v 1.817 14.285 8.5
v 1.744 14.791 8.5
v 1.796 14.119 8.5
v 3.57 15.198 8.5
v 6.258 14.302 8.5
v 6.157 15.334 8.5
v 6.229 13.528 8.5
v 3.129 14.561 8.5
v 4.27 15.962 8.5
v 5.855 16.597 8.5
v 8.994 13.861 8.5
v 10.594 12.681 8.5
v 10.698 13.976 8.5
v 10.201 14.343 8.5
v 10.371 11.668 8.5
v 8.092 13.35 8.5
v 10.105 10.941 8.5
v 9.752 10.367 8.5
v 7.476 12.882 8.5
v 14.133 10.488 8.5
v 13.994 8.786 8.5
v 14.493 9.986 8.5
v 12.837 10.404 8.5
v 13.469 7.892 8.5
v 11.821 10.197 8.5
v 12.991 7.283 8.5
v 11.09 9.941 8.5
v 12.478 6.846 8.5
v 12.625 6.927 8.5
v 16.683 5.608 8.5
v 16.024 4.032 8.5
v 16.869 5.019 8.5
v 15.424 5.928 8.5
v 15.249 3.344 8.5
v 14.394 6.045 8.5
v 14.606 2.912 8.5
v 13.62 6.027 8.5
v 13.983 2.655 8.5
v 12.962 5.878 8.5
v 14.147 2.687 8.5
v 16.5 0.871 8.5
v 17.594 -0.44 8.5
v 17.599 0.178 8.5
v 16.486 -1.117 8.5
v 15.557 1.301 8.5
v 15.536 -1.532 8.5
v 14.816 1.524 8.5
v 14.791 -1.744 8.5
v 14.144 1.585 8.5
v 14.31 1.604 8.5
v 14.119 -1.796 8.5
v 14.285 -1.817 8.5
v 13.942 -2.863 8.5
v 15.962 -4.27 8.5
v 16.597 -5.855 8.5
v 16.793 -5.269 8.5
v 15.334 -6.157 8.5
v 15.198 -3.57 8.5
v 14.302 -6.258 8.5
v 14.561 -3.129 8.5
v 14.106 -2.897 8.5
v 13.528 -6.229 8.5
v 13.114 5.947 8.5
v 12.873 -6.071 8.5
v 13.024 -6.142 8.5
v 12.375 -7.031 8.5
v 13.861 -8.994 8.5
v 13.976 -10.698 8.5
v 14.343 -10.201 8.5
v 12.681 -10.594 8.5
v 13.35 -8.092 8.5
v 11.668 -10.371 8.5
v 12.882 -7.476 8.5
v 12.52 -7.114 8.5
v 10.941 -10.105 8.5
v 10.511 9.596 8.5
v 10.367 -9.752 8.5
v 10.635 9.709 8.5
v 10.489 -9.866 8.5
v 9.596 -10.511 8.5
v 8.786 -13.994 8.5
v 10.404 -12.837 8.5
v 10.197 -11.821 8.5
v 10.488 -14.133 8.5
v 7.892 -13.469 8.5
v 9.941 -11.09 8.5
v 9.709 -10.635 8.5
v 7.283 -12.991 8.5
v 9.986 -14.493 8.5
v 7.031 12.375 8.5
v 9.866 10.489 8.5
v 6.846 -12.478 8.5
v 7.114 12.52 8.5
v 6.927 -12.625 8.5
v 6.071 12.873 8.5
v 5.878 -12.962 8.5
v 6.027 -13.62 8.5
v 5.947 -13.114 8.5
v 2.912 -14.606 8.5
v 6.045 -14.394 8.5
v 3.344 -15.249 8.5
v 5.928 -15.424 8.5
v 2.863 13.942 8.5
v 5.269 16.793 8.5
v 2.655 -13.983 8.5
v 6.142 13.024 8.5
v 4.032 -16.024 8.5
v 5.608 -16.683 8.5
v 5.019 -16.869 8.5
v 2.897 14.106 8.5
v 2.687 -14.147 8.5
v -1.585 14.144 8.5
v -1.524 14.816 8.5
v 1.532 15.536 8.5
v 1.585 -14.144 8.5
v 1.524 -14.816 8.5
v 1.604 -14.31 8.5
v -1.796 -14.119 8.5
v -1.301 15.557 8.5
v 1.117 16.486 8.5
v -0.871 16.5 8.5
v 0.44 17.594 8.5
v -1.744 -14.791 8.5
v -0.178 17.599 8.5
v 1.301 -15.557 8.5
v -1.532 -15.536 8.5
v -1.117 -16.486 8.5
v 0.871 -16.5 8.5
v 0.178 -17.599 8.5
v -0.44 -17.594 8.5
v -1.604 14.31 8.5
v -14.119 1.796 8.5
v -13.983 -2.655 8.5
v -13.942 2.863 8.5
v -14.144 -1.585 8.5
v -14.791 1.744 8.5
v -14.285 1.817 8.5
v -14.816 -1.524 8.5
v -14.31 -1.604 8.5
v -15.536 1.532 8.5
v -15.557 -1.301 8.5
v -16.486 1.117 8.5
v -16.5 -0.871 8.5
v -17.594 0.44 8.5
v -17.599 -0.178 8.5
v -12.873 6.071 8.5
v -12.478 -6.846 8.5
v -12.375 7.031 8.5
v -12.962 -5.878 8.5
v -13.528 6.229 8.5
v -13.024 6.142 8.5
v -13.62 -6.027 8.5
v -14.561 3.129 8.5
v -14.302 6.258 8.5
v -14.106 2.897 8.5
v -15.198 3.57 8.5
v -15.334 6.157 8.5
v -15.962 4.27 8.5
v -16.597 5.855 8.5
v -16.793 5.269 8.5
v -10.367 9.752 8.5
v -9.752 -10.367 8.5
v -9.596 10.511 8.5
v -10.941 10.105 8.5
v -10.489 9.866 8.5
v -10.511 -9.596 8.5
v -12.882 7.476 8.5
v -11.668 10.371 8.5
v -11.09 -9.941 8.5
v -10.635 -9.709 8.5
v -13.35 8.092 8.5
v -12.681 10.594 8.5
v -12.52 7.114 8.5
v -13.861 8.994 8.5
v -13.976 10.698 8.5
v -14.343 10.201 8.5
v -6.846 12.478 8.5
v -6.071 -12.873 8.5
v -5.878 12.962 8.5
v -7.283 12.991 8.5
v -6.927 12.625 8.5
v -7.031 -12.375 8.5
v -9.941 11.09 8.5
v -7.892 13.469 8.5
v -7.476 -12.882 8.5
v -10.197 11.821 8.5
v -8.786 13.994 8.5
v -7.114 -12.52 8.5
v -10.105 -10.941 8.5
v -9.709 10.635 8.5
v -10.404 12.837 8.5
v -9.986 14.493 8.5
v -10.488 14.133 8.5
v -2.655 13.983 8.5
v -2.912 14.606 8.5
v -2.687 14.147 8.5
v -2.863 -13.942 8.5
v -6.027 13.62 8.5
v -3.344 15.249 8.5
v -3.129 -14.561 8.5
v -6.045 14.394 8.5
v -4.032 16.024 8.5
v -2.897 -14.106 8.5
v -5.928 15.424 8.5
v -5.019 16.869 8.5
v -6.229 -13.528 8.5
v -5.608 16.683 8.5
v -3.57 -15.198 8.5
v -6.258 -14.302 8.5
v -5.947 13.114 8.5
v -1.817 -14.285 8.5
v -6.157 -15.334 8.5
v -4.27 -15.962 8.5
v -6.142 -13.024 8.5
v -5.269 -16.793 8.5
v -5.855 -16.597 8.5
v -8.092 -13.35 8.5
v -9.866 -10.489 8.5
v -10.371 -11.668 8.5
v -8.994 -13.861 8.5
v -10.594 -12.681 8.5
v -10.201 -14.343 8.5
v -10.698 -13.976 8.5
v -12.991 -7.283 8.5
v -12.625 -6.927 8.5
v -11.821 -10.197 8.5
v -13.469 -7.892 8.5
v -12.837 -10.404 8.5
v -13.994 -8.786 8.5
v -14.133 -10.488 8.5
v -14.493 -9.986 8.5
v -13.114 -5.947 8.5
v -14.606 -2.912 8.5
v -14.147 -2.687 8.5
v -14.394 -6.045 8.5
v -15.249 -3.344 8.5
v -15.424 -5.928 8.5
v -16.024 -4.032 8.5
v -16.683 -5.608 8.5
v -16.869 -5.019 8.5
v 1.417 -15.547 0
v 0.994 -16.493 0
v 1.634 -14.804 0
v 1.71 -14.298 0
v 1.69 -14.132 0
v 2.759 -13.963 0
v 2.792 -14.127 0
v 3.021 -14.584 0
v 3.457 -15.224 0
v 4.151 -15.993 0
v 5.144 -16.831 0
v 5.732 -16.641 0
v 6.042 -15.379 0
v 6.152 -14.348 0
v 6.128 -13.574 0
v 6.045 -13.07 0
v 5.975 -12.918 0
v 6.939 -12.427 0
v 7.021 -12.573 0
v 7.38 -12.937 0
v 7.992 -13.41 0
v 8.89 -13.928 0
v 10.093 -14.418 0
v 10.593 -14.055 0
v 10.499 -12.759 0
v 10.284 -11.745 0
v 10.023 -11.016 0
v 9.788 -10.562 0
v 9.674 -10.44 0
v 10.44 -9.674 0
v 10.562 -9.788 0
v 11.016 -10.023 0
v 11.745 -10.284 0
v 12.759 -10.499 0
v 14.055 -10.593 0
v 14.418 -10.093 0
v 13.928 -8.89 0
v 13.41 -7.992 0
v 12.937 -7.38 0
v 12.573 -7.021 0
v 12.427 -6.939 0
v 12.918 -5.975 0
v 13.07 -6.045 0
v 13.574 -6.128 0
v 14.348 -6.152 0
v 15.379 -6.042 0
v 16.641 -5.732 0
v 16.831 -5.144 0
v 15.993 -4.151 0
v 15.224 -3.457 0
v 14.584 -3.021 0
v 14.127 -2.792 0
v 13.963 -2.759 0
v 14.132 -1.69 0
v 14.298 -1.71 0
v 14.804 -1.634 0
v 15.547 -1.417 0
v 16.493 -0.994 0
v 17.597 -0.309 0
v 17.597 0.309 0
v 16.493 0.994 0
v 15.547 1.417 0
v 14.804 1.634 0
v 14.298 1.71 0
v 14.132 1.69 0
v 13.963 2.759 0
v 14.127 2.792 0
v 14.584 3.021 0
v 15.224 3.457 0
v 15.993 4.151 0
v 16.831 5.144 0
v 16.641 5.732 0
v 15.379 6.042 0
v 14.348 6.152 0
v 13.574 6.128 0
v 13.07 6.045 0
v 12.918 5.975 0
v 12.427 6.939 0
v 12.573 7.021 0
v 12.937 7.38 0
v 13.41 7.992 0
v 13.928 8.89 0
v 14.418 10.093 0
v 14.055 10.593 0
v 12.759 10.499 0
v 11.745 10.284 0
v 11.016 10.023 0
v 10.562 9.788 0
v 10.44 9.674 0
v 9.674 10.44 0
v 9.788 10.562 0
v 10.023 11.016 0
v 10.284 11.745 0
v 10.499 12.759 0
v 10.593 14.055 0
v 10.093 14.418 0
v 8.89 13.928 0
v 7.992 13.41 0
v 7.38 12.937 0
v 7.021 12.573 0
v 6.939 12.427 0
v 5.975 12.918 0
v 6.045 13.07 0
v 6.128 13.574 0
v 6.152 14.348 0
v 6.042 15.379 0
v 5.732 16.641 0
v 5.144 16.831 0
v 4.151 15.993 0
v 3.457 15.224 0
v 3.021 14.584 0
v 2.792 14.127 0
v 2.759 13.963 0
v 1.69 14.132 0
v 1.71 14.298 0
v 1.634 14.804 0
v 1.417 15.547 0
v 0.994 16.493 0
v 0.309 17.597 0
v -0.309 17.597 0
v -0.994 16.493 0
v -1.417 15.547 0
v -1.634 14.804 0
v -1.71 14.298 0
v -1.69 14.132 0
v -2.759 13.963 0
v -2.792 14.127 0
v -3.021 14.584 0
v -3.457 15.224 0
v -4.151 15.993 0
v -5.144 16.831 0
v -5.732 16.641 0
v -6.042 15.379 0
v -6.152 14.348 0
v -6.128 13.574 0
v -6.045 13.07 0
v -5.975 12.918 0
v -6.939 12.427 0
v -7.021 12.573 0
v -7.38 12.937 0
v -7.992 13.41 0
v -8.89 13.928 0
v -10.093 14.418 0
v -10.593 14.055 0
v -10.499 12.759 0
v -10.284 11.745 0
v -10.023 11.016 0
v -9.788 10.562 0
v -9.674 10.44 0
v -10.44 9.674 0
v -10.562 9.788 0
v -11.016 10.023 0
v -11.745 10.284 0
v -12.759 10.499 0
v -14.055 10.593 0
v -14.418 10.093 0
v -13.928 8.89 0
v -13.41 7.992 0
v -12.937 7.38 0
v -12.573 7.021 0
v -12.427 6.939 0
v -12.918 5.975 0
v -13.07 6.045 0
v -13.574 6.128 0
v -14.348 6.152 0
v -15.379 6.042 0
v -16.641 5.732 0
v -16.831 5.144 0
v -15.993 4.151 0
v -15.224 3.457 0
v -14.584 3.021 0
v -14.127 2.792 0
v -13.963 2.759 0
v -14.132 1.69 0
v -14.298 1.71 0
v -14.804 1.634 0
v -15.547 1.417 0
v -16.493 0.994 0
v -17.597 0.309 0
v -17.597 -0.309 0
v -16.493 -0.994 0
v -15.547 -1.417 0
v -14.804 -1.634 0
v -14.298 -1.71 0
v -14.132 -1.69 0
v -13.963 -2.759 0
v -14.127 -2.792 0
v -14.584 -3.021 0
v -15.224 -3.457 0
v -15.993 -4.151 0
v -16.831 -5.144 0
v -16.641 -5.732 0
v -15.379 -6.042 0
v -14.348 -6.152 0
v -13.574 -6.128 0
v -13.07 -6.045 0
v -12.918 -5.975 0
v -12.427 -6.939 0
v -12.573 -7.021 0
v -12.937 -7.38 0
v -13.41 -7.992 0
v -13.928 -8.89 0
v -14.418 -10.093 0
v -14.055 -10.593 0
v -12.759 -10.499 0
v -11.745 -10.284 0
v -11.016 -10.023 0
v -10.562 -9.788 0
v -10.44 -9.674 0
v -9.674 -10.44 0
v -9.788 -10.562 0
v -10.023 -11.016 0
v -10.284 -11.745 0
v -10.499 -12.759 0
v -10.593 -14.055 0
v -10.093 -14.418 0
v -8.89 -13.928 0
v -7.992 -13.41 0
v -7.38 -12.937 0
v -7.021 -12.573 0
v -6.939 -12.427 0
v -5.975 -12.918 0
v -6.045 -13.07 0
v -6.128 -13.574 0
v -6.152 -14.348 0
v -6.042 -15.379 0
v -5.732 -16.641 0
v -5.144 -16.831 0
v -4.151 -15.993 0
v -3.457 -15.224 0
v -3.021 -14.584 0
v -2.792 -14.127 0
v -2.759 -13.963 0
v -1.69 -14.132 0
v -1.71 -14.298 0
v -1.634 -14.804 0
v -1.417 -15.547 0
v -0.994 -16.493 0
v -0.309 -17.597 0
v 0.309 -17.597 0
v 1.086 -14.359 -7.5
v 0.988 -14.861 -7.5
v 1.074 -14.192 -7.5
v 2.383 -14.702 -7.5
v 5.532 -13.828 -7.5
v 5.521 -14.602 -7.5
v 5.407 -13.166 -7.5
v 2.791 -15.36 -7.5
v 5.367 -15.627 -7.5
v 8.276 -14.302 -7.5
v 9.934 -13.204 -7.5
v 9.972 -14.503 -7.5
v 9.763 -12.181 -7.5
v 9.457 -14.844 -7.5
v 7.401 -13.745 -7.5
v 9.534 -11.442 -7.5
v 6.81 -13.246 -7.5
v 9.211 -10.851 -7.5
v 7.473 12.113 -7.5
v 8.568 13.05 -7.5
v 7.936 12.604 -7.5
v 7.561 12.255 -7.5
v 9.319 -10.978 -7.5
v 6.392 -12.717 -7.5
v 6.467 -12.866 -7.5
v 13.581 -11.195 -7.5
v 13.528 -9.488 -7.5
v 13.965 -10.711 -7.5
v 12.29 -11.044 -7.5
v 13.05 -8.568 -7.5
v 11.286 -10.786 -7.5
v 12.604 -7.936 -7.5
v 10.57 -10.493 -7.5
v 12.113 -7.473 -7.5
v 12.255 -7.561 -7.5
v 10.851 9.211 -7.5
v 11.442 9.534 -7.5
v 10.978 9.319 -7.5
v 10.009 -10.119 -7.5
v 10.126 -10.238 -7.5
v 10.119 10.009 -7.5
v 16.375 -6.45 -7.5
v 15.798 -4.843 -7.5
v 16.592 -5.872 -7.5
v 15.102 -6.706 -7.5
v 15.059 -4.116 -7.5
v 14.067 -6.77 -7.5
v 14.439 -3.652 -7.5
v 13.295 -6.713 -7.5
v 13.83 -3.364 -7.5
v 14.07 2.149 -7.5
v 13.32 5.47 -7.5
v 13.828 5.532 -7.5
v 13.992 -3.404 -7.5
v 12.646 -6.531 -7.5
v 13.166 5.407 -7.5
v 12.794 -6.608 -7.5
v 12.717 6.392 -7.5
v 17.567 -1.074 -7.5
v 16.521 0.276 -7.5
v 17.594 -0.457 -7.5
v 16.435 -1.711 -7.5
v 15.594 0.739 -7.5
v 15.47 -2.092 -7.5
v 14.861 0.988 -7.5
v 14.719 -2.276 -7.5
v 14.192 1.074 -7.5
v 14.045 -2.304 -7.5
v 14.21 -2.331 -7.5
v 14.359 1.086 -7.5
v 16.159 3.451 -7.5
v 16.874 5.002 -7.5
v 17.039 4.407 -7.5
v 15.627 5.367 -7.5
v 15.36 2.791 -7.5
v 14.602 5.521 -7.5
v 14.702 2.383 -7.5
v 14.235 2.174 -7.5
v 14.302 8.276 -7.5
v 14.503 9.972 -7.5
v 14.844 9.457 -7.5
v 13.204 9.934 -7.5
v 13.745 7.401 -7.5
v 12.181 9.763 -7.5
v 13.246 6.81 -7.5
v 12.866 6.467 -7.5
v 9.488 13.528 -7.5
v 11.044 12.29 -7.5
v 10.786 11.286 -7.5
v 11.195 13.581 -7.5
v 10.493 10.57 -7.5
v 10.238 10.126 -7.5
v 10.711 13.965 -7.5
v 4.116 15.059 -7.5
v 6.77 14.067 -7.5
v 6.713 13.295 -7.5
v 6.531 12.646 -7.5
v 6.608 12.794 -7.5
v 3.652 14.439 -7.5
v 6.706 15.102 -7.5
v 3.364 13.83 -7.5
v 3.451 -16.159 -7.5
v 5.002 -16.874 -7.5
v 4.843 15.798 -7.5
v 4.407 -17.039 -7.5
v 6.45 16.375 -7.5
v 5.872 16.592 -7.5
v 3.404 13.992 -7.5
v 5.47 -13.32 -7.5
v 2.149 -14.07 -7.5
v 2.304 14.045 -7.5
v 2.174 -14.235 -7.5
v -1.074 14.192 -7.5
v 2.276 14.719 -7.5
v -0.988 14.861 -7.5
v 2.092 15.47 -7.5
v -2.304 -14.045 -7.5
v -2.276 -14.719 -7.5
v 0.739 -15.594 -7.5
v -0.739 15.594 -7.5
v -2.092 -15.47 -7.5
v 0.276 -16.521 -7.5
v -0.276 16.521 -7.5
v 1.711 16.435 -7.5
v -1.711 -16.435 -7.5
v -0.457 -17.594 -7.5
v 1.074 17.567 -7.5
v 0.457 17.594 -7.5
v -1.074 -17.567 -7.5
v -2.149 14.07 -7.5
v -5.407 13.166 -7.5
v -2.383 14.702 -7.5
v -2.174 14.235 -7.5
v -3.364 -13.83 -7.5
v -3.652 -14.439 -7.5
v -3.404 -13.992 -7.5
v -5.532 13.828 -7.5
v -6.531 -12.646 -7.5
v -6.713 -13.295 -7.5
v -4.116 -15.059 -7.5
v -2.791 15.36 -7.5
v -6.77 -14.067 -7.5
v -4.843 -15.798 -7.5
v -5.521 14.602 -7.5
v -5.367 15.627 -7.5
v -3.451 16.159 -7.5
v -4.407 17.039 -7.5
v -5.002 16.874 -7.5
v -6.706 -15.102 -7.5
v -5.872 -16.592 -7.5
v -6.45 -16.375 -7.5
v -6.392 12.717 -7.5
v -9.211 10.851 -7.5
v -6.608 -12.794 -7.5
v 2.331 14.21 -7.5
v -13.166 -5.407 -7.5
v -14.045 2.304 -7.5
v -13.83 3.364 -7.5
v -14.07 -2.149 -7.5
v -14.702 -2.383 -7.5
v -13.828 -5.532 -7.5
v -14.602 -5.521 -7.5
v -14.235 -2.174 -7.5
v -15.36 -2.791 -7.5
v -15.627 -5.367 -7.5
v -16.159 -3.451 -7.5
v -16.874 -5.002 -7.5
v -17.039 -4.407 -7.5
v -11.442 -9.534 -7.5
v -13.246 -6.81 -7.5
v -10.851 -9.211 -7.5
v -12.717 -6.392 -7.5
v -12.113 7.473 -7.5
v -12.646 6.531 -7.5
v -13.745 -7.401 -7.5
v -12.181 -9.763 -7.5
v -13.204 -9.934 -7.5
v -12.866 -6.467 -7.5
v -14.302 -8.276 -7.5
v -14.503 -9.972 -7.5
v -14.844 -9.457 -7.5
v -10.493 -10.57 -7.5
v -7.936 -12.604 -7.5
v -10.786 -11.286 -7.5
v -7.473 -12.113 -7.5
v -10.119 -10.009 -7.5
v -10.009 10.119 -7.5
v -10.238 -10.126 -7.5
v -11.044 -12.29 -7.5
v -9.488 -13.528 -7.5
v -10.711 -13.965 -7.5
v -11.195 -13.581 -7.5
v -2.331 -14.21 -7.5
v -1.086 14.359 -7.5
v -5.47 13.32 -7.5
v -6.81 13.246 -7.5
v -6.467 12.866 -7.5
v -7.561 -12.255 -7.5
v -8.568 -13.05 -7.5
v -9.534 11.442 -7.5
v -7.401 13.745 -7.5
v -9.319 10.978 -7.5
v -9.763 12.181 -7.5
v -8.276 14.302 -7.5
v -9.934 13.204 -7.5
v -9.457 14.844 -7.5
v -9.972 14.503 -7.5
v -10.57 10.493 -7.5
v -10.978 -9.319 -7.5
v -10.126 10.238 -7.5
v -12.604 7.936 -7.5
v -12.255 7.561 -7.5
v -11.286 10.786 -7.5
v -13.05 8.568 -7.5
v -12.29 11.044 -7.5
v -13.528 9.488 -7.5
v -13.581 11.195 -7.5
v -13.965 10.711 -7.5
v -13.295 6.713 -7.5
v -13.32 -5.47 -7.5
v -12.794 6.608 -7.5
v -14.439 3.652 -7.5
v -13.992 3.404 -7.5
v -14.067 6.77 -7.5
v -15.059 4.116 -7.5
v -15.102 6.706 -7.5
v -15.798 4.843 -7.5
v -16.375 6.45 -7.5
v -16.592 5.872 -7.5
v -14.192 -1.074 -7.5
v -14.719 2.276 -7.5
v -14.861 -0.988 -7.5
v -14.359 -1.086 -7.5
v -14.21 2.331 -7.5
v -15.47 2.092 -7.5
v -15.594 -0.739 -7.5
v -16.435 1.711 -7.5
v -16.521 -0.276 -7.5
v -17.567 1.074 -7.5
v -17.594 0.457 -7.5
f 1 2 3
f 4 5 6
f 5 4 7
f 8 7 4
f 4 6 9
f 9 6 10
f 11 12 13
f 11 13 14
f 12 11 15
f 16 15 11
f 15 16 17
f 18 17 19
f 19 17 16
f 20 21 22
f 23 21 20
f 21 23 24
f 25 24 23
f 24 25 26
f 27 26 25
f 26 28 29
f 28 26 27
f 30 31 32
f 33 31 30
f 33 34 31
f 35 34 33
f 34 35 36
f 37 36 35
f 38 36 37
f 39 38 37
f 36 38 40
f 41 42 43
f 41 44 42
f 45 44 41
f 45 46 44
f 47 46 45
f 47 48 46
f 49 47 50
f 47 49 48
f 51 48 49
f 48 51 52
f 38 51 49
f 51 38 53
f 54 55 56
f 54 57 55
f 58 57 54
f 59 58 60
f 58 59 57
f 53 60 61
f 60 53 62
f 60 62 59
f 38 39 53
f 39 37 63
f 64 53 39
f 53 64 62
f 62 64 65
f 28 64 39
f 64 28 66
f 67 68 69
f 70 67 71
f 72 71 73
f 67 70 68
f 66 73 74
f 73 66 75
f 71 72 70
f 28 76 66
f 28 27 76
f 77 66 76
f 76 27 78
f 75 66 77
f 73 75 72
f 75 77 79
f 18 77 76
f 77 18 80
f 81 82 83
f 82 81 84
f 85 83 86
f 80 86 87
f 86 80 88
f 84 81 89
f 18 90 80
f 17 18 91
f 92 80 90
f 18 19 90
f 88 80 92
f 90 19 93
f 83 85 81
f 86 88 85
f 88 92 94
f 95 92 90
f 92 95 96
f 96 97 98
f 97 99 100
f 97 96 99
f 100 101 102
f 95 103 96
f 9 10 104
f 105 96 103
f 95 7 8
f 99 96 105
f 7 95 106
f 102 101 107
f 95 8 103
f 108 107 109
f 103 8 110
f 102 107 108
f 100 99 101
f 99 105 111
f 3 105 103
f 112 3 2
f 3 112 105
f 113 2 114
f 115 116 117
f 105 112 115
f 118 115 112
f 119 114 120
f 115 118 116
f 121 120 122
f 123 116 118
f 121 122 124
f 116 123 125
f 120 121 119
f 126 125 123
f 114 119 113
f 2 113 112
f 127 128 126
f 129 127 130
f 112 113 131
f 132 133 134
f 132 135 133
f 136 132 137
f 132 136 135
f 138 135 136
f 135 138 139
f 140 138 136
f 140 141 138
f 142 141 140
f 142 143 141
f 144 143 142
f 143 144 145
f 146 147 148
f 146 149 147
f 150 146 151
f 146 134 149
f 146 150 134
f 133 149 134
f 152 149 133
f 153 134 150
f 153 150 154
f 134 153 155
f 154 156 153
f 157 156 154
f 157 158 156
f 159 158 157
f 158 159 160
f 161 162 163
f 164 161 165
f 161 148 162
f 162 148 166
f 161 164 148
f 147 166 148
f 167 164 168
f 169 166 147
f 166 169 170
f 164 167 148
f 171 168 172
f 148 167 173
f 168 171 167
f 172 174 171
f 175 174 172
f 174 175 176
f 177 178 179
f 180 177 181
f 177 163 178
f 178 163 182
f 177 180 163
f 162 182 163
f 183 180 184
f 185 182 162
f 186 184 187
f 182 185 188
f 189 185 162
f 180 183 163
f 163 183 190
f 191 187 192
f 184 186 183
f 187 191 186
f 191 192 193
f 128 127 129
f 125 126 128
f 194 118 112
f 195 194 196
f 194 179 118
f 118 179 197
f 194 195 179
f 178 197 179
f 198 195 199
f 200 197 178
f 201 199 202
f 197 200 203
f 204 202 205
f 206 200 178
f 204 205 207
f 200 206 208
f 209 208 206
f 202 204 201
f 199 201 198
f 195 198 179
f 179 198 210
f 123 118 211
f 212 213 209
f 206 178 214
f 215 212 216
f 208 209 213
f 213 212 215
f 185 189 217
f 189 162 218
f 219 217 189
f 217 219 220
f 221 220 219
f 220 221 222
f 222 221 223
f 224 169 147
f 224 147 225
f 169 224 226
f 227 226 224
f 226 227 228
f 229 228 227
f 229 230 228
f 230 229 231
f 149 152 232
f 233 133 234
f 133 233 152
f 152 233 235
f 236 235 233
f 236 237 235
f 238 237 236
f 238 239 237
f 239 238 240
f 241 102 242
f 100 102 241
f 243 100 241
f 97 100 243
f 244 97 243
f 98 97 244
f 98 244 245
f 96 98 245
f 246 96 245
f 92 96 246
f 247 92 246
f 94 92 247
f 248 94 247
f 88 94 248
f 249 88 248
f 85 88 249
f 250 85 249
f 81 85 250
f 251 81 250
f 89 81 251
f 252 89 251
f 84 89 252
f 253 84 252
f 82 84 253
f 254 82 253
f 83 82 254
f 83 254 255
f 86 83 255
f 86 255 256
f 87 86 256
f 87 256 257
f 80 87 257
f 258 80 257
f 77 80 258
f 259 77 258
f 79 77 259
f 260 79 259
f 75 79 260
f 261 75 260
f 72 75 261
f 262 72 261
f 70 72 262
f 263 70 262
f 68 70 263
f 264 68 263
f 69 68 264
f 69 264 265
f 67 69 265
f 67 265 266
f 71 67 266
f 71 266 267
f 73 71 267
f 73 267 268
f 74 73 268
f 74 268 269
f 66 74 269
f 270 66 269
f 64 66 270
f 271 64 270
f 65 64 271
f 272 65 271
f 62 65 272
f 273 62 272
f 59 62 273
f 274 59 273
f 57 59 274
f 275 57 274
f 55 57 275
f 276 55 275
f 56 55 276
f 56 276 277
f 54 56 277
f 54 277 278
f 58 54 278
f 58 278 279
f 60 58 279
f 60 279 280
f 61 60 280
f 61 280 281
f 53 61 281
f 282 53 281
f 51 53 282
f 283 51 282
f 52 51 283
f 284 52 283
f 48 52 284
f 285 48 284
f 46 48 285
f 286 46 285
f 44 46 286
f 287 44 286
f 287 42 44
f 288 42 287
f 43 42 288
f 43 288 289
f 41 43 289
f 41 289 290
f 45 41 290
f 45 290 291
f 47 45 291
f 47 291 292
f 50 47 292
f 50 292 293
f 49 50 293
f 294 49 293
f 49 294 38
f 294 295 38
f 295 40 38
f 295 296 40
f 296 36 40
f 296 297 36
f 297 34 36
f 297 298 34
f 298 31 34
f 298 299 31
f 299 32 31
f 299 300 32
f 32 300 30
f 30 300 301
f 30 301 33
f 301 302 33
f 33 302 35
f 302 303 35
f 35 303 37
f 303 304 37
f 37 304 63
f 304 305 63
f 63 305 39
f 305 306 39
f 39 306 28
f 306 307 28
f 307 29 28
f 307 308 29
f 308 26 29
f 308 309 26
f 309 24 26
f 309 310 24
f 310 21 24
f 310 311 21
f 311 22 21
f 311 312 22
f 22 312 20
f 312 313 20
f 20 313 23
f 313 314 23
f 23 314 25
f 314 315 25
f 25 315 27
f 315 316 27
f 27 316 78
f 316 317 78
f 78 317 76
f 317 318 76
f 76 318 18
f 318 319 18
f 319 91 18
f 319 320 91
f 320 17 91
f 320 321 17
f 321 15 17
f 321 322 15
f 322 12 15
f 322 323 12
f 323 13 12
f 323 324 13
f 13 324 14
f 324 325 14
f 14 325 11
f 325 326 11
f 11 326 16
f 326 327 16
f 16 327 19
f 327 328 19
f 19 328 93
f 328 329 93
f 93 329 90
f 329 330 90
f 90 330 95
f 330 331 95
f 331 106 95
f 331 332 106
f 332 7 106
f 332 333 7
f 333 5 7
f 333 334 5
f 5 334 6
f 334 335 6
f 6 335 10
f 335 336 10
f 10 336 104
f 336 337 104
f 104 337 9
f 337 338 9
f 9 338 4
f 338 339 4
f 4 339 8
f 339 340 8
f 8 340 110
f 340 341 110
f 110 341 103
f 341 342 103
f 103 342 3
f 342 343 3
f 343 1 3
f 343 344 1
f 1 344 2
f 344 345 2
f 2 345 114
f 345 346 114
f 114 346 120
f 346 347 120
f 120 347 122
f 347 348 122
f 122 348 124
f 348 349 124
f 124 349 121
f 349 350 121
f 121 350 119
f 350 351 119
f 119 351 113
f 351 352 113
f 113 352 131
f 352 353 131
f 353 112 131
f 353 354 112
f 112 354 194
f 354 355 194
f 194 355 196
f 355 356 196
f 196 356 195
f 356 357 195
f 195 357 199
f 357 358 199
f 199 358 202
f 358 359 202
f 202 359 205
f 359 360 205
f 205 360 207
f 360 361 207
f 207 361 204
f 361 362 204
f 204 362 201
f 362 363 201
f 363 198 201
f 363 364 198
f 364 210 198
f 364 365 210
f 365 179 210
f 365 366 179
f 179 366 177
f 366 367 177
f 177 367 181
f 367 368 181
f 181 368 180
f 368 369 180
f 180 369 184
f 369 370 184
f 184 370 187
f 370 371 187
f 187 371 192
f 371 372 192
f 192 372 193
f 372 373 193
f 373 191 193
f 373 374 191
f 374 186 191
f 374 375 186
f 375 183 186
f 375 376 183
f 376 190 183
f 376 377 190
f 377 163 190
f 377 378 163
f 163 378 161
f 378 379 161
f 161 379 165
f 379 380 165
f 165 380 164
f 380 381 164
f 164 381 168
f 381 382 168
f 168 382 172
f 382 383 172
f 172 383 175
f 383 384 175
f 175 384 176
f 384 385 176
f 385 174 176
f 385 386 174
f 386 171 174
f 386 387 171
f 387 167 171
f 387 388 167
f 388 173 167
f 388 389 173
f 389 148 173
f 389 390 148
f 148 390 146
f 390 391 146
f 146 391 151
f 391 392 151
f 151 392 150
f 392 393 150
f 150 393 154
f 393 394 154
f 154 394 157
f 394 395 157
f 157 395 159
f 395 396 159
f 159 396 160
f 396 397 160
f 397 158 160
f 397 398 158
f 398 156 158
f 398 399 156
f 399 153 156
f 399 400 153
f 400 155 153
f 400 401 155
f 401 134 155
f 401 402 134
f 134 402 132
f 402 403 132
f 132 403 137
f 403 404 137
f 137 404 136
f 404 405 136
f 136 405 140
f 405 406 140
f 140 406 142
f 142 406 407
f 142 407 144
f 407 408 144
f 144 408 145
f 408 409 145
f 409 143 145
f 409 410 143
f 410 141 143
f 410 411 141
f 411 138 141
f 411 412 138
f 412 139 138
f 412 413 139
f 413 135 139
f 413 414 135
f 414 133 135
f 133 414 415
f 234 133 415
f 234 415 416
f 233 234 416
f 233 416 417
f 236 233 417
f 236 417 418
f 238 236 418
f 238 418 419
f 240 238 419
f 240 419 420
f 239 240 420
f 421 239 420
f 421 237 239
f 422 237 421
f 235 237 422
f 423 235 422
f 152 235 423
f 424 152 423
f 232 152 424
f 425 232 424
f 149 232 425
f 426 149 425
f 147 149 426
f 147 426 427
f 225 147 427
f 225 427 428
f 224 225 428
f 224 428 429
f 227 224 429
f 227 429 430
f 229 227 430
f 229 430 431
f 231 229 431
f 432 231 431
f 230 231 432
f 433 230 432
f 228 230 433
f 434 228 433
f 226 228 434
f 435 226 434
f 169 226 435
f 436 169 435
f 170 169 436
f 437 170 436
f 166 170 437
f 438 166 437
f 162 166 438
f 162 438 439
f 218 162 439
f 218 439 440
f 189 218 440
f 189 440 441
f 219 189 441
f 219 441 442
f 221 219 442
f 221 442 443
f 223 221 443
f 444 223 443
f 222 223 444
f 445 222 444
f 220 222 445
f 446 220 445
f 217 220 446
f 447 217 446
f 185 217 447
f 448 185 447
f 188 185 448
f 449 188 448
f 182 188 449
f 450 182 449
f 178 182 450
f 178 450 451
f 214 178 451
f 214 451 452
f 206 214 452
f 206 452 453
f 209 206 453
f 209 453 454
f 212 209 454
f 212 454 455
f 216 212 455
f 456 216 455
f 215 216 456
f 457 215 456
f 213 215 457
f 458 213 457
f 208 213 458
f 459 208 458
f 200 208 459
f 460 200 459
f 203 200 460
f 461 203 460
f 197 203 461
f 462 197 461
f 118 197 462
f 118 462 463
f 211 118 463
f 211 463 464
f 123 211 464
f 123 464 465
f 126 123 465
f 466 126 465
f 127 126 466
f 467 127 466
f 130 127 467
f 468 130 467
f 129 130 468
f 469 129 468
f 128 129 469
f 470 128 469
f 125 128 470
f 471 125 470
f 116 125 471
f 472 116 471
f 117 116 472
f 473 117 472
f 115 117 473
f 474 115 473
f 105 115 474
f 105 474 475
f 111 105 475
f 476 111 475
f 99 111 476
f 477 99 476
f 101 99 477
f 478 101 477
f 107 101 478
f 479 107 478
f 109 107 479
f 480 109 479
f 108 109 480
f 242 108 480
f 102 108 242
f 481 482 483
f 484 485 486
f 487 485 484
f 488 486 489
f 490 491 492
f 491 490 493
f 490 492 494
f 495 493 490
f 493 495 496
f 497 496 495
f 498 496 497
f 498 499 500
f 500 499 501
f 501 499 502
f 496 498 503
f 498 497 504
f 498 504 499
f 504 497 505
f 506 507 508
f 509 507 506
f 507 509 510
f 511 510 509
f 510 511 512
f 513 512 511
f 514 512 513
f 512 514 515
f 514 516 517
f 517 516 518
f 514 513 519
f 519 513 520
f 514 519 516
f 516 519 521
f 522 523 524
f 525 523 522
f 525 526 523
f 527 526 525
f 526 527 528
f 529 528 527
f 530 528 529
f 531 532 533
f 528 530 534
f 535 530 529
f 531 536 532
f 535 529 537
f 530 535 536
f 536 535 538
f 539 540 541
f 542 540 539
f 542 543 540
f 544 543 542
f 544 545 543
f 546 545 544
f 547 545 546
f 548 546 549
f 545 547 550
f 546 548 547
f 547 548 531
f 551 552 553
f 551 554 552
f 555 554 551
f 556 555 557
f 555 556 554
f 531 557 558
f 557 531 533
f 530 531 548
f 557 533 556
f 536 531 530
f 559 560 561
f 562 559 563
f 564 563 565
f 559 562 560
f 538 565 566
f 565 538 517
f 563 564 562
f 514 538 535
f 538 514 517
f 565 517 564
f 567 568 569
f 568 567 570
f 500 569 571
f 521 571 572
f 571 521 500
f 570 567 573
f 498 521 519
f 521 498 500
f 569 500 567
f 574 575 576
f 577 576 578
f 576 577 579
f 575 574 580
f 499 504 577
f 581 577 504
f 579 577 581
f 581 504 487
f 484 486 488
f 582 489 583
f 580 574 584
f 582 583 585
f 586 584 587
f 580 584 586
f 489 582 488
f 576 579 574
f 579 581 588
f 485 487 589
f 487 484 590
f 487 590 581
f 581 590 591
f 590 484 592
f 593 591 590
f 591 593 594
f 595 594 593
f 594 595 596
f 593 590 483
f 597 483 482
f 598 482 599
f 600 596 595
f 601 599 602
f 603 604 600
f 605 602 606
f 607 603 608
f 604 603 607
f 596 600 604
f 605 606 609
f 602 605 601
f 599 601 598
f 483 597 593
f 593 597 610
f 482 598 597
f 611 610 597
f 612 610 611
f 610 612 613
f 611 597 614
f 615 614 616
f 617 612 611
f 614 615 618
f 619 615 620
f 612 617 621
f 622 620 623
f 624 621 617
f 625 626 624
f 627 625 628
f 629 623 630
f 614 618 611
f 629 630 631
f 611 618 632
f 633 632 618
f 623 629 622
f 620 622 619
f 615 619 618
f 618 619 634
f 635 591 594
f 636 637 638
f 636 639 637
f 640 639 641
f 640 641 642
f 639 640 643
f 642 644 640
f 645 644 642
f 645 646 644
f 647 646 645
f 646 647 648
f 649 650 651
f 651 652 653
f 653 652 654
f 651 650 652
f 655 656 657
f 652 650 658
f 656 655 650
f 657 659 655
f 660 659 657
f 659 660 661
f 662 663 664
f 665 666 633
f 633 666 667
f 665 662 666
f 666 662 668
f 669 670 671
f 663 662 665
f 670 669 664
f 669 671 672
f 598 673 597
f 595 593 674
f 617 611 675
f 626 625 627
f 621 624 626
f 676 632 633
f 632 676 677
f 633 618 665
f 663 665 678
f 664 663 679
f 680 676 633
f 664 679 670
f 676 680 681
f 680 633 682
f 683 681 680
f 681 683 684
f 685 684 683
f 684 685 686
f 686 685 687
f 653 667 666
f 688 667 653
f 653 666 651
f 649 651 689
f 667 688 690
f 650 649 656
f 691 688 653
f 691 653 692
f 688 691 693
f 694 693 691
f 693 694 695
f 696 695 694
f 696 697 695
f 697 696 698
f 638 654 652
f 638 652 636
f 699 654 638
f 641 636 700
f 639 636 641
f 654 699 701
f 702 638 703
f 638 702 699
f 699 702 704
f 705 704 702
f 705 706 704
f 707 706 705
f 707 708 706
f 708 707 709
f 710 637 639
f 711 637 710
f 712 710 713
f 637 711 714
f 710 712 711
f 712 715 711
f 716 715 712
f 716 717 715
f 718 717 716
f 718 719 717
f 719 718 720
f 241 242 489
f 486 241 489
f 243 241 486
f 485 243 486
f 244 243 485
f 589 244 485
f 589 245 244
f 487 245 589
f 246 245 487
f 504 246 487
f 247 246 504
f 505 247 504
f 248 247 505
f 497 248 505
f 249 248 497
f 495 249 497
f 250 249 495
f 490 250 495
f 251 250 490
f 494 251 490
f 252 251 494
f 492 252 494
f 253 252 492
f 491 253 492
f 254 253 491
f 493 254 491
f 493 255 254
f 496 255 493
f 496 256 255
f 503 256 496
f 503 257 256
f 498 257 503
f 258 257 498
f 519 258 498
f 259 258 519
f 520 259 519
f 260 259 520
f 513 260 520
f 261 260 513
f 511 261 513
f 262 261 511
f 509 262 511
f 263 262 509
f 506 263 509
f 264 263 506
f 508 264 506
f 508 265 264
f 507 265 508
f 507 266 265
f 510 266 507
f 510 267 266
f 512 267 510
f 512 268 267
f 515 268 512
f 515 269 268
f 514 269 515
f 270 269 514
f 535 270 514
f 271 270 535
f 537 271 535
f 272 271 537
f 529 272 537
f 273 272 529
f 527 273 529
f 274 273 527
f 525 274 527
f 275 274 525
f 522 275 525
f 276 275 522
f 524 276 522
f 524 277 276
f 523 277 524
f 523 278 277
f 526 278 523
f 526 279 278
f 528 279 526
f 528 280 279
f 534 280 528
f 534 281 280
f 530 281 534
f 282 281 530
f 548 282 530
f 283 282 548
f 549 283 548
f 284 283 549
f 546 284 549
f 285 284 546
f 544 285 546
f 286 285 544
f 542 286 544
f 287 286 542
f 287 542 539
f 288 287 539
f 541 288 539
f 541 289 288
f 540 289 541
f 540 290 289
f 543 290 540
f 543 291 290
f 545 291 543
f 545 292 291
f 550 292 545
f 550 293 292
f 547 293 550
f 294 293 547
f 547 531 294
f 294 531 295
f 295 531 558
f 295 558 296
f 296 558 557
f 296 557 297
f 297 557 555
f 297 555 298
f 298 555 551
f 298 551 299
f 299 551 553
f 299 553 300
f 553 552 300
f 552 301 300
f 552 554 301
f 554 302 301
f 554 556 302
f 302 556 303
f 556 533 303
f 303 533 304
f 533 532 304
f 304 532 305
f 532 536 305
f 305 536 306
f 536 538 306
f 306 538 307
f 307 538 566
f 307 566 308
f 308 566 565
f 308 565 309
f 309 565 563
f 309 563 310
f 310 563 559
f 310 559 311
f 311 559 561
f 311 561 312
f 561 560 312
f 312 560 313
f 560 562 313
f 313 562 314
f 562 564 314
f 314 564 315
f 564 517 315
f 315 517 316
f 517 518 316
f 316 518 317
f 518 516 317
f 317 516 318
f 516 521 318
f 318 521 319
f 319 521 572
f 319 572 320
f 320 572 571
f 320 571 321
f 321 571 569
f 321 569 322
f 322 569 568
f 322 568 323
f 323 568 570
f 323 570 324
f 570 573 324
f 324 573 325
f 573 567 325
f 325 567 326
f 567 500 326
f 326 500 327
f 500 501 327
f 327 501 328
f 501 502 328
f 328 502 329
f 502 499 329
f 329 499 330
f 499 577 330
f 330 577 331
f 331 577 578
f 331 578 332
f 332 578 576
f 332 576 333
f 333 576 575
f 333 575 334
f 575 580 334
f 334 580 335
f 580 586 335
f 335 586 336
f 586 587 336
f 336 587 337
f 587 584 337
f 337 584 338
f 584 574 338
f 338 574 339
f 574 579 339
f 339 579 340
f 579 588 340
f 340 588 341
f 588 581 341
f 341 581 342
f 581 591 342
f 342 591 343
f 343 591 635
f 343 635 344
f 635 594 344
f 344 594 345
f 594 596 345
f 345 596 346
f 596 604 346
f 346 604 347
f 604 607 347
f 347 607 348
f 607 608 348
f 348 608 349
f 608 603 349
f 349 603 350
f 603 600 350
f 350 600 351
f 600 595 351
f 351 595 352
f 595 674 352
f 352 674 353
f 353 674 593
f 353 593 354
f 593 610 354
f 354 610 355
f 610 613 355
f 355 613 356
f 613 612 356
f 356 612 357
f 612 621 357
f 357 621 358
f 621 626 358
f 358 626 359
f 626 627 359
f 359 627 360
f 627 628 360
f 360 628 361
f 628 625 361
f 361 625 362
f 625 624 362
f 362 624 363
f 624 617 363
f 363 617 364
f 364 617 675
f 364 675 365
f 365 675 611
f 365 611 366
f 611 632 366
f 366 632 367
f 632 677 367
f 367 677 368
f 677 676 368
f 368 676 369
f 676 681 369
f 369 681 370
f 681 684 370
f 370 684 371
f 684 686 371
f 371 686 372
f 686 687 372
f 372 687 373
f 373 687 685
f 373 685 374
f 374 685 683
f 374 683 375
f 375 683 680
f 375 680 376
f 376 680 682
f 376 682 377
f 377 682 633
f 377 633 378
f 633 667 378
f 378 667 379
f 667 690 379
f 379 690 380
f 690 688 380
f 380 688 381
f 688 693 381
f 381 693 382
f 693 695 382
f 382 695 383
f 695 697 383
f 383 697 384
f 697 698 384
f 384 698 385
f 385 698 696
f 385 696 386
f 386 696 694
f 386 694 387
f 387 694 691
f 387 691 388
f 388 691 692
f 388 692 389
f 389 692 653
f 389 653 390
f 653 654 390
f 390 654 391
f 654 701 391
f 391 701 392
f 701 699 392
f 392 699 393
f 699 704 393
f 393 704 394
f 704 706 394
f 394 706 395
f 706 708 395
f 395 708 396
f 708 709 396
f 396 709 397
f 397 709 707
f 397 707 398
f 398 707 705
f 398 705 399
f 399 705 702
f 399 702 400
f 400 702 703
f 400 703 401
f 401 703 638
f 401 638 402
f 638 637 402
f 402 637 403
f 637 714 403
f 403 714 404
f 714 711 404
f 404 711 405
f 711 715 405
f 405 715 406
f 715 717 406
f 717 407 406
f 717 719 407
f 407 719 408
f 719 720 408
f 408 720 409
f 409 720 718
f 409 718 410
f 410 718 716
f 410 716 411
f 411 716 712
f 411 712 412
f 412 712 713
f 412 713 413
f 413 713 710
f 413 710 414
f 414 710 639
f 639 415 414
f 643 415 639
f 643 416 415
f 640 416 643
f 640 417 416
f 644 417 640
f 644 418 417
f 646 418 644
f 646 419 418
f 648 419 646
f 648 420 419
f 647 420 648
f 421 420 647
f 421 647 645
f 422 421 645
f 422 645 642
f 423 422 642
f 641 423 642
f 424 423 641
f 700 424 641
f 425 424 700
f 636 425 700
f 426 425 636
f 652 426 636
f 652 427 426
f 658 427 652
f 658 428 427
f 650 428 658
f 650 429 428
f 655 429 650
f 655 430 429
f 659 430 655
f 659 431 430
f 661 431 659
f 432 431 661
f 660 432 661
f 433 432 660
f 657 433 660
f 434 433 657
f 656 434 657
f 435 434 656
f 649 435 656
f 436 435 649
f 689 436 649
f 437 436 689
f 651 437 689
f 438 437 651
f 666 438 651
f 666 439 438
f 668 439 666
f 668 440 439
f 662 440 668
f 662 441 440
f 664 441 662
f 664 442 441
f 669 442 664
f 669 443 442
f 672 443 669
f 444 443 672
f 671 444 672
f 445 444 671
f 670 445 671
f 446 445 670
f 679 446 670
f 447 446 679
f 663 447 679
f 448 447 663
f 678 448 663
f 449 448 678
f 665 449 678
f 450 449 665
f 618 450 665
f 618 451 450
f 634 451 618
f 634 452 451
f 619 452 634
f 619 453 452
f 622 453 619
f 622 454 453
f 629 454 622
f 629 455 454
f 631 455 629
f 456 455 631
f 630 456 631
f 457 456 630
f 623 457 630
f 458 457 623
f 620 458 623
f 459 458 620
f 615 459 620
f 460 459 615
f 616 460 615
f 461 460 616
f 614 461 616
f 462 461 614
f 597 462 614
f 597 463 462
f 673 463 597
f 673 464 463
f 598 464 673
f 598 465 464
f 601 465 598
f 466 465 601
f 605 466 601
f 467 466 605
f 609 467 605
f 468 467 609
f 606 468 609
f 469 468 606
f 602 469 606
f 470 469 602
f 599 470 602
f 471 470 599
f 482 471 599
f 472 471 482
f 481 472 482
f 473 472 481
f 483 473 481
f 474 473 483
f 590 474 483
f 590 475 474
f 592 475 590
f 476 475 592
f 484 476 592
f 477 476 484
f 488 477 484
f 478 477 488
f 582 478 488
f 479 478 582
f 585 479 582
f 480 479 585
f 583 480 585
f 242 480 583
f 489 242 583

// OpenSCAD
translate([0,0,0])gear20();
//gear40();

module gear20(){
union(){
difference(){
		gear(pitch_radius=16, teeth=20, height=8.5, helix_angle=30);
		translate([0,0,-1]){
			//cylinder(r=4.2,h=10);
			for(i=[0:3]){
				//rotate(i*90)translate([8,0,0])cylinder(r=2.1,h=10, $fn=10);
			}
		}
	}	
mirror([0,0,1]){difference(){
		gear(pitch_radius=16, teeth=20, height=7.5, helix_angle=30);
		translate([0,0,-1]){
			//cylinder(r=4.2,h=10);
			for(i=[0:3]){
				//rotate(i*90)translate([8,0,0])cylinder(r=2.1,h=10, $fn=10);
			}
		}
	}
}
}
}

module gear40(){

	difference(){
		rotate(36/8)gear(pitch_radius=32, teeth=40, height=7.5, helix_angle=-30);
		translate([0,0,-1]){
			//cylinder(r=4.2,h=10);
			for(i=[0:3]){
				//rotate(i*90)translate([8,0,0])cylinder(r=2.1,h=10,$fn=10);
				//rotate(i*90)translate([24,0,0])cylinder(r=2.1,h=10,$fn=10);
			}
		}
	}
mirror([0,0,1])difference(){
		rotate(36/8)gear(pitch_radius=32, teeth=40, height=7.5, helix_angle=-30);
		translate([0,0,-1]){
			//cylinder(r=4.2,h=10);
			for(i=[0:3]){
				//rotate(i*90)translate([8,0,0])cylinder(r=2.1,h=10,$fn=10);
				//rotate(i*90)translate([24,0,0])cylinder(r=2.1,h=10,$fn=10);
			}
		}
	}

}

/* GEAR */
module gear(
		pitch_radius,
		teeth,
		height,
		pressure_angle=28,
		clearance=0,
		backlash=0,
		involute_facets=5,
		helix_angle=0,
		helix_segments=1){
// Properties
base_radius=pitch_radius*cos(pressure_angle);
addendum = 2*pitch_radius/teeth;
circular_pitch = pitch_radius*6.28318531/teeth;
outside_radius = pitch_radius + addendum;
dedendum = addendum+clearance;
root_radius = pitch_radius-dedendum;
// Calculations
min_t=base_radius<root_radius?angle(root_radius,base_radius):0;
max_t=angle(outside_radius,base_radius);
delta_t=(max_t-min_t)/(involute_facets-1);
half_circular_thickness_angle = 28.64788976/pitch_radius*(circular_pitch-backlash)*.5;
pitch_involute_point=involute(angle(pitch_radius,base_radius),base_radius);
offset=atan2(pitch_involute_point[1],pitch_involute_point[0]);
// Construction
linear_extrude(height=height,twist=tan(-helix_angle)*height*57.29577951/pitch_radius,slices=helix_segments,convexity=teeth){
	circle(r=root_radius,$fn=teeth);
	for(i=[0:involute_facets-2]){
		assign(point1=rotate(involute(min_t+i*delta_t,base_radius),-offset-half_circular_thickness_angle),
		point2=rotate(involute(min_t+(i+1)*delta_t,base_radius),-offset-half_circular_thickness_angle),
		delta_theta=360/teeth){
			for(theta=[0:teeth-1]){
				rotate(theta*delta_theta)
					polygon(points=[[0,0],point1,point2,mirror(point2),mirror(point1)],paths=[[0,1,2,3,4]]);
			}
		}
	}
}}

/* RACK GEAR */
module rack(
		mating_pitch_radius,
		mating_teeth,
		teeth,
		height,
		base_depth,
		pressure_angle=28,
		clearance=0,
		backlash=0,
		helix_angle=0){
// Properties
addendum=2*mating_pitch_radius/mating_teeth;
dedendum=addendum+clearance;
offset_a=tan(pressure_angle)*addendum;
offset_d=tan(pressure_angle)*dedendum;
half_tooth_width=mating_pitch_radius*1.57079633/mating_teeth;
helix_offset=tan(helix_angle)*height;
// Construct teeth
for(i=[0:teeth-1]){
	translate([i*half_tooth_width*4-half_tooth_width,0,0])
		polyhedron(points=[[-offset_d+backlash/4,-dedendum,0],[offset_a+backlash/4,addendum,0],[2*half_tooth_width-offset_a-backlash/4,addendum,0],[2*half_tooth_width+offset_d-backlash/4,-dedendum,0],[-offset_d+backlash/4+helix_offset,-dedendum,height],[offset_a+backlash/4+helix_offset,addendum,height],[2*half_tooth_width-offset_a-backlash/4+helix_offset,addendum,height],[2*half_tooth_width+offset_d-backlash/4+helix_offset,-dedendum,height]],triangles=[[0,1,2],[2,3,0],[4,5,6],[6,7,4],[0,1,4],[1,4,5],[1,2,5],[5,6,2],[2,3,6],[6,7,3],[0,3,4],[4,7,3]],convexity=1);
}
// Construct base
if(base_depth<dedendum){echo("ERROR: Rack base_depth too small.");}
x=-offset_d-half_tooth_width+backlash/4;
y=-base_depth;
x2=x+helix_offset;
width=half_tooth_width*4*(teeth-1)+half_tooth_width*2+2*offset_d-backlash/2;
length=base_depth-dedendum;
polyhedron(points=[[x,y,0],[x,y+length,0],[x+width,y+length,0],[x+width,y,0],[x2,y,height],[x2,y+length,height],[x2+width,y+length,height],[x2+width,y,height]],triangles=[[0,1,2],[2,3,0],[4,5,6],[6,7,4],[0,1,4],[1,4,5],[1,2,5],[5,6,2],[2,3,6],[6,7,3],[0,3,4],[4,7,3]]);
}

/* FUNCTIONS */
function toRadians(angle) = angle*0.01745329;
function toDegrees(angle) = angle*57.29577951;
function rotate(point,angle)=[point[0]*cos(angle)-point[1]*sin(angle), point[1]*cos(angle)+point[0]*sin(angle)];
function mirror(point)=[point[0],-point[1]];
// [x,y] for 't' on parametric involute with base radius 'b'
	function involute(t,b)=b*[cos(t)+toRadians(t)*sin(t),sin(t)-toRadians(t)*cos(t)];
// 't' for parametric involute with base radius 'b' at radius 'r'
	function angle(r,b)=toDegrees(sqrt(pow(r/b,2)-1));
